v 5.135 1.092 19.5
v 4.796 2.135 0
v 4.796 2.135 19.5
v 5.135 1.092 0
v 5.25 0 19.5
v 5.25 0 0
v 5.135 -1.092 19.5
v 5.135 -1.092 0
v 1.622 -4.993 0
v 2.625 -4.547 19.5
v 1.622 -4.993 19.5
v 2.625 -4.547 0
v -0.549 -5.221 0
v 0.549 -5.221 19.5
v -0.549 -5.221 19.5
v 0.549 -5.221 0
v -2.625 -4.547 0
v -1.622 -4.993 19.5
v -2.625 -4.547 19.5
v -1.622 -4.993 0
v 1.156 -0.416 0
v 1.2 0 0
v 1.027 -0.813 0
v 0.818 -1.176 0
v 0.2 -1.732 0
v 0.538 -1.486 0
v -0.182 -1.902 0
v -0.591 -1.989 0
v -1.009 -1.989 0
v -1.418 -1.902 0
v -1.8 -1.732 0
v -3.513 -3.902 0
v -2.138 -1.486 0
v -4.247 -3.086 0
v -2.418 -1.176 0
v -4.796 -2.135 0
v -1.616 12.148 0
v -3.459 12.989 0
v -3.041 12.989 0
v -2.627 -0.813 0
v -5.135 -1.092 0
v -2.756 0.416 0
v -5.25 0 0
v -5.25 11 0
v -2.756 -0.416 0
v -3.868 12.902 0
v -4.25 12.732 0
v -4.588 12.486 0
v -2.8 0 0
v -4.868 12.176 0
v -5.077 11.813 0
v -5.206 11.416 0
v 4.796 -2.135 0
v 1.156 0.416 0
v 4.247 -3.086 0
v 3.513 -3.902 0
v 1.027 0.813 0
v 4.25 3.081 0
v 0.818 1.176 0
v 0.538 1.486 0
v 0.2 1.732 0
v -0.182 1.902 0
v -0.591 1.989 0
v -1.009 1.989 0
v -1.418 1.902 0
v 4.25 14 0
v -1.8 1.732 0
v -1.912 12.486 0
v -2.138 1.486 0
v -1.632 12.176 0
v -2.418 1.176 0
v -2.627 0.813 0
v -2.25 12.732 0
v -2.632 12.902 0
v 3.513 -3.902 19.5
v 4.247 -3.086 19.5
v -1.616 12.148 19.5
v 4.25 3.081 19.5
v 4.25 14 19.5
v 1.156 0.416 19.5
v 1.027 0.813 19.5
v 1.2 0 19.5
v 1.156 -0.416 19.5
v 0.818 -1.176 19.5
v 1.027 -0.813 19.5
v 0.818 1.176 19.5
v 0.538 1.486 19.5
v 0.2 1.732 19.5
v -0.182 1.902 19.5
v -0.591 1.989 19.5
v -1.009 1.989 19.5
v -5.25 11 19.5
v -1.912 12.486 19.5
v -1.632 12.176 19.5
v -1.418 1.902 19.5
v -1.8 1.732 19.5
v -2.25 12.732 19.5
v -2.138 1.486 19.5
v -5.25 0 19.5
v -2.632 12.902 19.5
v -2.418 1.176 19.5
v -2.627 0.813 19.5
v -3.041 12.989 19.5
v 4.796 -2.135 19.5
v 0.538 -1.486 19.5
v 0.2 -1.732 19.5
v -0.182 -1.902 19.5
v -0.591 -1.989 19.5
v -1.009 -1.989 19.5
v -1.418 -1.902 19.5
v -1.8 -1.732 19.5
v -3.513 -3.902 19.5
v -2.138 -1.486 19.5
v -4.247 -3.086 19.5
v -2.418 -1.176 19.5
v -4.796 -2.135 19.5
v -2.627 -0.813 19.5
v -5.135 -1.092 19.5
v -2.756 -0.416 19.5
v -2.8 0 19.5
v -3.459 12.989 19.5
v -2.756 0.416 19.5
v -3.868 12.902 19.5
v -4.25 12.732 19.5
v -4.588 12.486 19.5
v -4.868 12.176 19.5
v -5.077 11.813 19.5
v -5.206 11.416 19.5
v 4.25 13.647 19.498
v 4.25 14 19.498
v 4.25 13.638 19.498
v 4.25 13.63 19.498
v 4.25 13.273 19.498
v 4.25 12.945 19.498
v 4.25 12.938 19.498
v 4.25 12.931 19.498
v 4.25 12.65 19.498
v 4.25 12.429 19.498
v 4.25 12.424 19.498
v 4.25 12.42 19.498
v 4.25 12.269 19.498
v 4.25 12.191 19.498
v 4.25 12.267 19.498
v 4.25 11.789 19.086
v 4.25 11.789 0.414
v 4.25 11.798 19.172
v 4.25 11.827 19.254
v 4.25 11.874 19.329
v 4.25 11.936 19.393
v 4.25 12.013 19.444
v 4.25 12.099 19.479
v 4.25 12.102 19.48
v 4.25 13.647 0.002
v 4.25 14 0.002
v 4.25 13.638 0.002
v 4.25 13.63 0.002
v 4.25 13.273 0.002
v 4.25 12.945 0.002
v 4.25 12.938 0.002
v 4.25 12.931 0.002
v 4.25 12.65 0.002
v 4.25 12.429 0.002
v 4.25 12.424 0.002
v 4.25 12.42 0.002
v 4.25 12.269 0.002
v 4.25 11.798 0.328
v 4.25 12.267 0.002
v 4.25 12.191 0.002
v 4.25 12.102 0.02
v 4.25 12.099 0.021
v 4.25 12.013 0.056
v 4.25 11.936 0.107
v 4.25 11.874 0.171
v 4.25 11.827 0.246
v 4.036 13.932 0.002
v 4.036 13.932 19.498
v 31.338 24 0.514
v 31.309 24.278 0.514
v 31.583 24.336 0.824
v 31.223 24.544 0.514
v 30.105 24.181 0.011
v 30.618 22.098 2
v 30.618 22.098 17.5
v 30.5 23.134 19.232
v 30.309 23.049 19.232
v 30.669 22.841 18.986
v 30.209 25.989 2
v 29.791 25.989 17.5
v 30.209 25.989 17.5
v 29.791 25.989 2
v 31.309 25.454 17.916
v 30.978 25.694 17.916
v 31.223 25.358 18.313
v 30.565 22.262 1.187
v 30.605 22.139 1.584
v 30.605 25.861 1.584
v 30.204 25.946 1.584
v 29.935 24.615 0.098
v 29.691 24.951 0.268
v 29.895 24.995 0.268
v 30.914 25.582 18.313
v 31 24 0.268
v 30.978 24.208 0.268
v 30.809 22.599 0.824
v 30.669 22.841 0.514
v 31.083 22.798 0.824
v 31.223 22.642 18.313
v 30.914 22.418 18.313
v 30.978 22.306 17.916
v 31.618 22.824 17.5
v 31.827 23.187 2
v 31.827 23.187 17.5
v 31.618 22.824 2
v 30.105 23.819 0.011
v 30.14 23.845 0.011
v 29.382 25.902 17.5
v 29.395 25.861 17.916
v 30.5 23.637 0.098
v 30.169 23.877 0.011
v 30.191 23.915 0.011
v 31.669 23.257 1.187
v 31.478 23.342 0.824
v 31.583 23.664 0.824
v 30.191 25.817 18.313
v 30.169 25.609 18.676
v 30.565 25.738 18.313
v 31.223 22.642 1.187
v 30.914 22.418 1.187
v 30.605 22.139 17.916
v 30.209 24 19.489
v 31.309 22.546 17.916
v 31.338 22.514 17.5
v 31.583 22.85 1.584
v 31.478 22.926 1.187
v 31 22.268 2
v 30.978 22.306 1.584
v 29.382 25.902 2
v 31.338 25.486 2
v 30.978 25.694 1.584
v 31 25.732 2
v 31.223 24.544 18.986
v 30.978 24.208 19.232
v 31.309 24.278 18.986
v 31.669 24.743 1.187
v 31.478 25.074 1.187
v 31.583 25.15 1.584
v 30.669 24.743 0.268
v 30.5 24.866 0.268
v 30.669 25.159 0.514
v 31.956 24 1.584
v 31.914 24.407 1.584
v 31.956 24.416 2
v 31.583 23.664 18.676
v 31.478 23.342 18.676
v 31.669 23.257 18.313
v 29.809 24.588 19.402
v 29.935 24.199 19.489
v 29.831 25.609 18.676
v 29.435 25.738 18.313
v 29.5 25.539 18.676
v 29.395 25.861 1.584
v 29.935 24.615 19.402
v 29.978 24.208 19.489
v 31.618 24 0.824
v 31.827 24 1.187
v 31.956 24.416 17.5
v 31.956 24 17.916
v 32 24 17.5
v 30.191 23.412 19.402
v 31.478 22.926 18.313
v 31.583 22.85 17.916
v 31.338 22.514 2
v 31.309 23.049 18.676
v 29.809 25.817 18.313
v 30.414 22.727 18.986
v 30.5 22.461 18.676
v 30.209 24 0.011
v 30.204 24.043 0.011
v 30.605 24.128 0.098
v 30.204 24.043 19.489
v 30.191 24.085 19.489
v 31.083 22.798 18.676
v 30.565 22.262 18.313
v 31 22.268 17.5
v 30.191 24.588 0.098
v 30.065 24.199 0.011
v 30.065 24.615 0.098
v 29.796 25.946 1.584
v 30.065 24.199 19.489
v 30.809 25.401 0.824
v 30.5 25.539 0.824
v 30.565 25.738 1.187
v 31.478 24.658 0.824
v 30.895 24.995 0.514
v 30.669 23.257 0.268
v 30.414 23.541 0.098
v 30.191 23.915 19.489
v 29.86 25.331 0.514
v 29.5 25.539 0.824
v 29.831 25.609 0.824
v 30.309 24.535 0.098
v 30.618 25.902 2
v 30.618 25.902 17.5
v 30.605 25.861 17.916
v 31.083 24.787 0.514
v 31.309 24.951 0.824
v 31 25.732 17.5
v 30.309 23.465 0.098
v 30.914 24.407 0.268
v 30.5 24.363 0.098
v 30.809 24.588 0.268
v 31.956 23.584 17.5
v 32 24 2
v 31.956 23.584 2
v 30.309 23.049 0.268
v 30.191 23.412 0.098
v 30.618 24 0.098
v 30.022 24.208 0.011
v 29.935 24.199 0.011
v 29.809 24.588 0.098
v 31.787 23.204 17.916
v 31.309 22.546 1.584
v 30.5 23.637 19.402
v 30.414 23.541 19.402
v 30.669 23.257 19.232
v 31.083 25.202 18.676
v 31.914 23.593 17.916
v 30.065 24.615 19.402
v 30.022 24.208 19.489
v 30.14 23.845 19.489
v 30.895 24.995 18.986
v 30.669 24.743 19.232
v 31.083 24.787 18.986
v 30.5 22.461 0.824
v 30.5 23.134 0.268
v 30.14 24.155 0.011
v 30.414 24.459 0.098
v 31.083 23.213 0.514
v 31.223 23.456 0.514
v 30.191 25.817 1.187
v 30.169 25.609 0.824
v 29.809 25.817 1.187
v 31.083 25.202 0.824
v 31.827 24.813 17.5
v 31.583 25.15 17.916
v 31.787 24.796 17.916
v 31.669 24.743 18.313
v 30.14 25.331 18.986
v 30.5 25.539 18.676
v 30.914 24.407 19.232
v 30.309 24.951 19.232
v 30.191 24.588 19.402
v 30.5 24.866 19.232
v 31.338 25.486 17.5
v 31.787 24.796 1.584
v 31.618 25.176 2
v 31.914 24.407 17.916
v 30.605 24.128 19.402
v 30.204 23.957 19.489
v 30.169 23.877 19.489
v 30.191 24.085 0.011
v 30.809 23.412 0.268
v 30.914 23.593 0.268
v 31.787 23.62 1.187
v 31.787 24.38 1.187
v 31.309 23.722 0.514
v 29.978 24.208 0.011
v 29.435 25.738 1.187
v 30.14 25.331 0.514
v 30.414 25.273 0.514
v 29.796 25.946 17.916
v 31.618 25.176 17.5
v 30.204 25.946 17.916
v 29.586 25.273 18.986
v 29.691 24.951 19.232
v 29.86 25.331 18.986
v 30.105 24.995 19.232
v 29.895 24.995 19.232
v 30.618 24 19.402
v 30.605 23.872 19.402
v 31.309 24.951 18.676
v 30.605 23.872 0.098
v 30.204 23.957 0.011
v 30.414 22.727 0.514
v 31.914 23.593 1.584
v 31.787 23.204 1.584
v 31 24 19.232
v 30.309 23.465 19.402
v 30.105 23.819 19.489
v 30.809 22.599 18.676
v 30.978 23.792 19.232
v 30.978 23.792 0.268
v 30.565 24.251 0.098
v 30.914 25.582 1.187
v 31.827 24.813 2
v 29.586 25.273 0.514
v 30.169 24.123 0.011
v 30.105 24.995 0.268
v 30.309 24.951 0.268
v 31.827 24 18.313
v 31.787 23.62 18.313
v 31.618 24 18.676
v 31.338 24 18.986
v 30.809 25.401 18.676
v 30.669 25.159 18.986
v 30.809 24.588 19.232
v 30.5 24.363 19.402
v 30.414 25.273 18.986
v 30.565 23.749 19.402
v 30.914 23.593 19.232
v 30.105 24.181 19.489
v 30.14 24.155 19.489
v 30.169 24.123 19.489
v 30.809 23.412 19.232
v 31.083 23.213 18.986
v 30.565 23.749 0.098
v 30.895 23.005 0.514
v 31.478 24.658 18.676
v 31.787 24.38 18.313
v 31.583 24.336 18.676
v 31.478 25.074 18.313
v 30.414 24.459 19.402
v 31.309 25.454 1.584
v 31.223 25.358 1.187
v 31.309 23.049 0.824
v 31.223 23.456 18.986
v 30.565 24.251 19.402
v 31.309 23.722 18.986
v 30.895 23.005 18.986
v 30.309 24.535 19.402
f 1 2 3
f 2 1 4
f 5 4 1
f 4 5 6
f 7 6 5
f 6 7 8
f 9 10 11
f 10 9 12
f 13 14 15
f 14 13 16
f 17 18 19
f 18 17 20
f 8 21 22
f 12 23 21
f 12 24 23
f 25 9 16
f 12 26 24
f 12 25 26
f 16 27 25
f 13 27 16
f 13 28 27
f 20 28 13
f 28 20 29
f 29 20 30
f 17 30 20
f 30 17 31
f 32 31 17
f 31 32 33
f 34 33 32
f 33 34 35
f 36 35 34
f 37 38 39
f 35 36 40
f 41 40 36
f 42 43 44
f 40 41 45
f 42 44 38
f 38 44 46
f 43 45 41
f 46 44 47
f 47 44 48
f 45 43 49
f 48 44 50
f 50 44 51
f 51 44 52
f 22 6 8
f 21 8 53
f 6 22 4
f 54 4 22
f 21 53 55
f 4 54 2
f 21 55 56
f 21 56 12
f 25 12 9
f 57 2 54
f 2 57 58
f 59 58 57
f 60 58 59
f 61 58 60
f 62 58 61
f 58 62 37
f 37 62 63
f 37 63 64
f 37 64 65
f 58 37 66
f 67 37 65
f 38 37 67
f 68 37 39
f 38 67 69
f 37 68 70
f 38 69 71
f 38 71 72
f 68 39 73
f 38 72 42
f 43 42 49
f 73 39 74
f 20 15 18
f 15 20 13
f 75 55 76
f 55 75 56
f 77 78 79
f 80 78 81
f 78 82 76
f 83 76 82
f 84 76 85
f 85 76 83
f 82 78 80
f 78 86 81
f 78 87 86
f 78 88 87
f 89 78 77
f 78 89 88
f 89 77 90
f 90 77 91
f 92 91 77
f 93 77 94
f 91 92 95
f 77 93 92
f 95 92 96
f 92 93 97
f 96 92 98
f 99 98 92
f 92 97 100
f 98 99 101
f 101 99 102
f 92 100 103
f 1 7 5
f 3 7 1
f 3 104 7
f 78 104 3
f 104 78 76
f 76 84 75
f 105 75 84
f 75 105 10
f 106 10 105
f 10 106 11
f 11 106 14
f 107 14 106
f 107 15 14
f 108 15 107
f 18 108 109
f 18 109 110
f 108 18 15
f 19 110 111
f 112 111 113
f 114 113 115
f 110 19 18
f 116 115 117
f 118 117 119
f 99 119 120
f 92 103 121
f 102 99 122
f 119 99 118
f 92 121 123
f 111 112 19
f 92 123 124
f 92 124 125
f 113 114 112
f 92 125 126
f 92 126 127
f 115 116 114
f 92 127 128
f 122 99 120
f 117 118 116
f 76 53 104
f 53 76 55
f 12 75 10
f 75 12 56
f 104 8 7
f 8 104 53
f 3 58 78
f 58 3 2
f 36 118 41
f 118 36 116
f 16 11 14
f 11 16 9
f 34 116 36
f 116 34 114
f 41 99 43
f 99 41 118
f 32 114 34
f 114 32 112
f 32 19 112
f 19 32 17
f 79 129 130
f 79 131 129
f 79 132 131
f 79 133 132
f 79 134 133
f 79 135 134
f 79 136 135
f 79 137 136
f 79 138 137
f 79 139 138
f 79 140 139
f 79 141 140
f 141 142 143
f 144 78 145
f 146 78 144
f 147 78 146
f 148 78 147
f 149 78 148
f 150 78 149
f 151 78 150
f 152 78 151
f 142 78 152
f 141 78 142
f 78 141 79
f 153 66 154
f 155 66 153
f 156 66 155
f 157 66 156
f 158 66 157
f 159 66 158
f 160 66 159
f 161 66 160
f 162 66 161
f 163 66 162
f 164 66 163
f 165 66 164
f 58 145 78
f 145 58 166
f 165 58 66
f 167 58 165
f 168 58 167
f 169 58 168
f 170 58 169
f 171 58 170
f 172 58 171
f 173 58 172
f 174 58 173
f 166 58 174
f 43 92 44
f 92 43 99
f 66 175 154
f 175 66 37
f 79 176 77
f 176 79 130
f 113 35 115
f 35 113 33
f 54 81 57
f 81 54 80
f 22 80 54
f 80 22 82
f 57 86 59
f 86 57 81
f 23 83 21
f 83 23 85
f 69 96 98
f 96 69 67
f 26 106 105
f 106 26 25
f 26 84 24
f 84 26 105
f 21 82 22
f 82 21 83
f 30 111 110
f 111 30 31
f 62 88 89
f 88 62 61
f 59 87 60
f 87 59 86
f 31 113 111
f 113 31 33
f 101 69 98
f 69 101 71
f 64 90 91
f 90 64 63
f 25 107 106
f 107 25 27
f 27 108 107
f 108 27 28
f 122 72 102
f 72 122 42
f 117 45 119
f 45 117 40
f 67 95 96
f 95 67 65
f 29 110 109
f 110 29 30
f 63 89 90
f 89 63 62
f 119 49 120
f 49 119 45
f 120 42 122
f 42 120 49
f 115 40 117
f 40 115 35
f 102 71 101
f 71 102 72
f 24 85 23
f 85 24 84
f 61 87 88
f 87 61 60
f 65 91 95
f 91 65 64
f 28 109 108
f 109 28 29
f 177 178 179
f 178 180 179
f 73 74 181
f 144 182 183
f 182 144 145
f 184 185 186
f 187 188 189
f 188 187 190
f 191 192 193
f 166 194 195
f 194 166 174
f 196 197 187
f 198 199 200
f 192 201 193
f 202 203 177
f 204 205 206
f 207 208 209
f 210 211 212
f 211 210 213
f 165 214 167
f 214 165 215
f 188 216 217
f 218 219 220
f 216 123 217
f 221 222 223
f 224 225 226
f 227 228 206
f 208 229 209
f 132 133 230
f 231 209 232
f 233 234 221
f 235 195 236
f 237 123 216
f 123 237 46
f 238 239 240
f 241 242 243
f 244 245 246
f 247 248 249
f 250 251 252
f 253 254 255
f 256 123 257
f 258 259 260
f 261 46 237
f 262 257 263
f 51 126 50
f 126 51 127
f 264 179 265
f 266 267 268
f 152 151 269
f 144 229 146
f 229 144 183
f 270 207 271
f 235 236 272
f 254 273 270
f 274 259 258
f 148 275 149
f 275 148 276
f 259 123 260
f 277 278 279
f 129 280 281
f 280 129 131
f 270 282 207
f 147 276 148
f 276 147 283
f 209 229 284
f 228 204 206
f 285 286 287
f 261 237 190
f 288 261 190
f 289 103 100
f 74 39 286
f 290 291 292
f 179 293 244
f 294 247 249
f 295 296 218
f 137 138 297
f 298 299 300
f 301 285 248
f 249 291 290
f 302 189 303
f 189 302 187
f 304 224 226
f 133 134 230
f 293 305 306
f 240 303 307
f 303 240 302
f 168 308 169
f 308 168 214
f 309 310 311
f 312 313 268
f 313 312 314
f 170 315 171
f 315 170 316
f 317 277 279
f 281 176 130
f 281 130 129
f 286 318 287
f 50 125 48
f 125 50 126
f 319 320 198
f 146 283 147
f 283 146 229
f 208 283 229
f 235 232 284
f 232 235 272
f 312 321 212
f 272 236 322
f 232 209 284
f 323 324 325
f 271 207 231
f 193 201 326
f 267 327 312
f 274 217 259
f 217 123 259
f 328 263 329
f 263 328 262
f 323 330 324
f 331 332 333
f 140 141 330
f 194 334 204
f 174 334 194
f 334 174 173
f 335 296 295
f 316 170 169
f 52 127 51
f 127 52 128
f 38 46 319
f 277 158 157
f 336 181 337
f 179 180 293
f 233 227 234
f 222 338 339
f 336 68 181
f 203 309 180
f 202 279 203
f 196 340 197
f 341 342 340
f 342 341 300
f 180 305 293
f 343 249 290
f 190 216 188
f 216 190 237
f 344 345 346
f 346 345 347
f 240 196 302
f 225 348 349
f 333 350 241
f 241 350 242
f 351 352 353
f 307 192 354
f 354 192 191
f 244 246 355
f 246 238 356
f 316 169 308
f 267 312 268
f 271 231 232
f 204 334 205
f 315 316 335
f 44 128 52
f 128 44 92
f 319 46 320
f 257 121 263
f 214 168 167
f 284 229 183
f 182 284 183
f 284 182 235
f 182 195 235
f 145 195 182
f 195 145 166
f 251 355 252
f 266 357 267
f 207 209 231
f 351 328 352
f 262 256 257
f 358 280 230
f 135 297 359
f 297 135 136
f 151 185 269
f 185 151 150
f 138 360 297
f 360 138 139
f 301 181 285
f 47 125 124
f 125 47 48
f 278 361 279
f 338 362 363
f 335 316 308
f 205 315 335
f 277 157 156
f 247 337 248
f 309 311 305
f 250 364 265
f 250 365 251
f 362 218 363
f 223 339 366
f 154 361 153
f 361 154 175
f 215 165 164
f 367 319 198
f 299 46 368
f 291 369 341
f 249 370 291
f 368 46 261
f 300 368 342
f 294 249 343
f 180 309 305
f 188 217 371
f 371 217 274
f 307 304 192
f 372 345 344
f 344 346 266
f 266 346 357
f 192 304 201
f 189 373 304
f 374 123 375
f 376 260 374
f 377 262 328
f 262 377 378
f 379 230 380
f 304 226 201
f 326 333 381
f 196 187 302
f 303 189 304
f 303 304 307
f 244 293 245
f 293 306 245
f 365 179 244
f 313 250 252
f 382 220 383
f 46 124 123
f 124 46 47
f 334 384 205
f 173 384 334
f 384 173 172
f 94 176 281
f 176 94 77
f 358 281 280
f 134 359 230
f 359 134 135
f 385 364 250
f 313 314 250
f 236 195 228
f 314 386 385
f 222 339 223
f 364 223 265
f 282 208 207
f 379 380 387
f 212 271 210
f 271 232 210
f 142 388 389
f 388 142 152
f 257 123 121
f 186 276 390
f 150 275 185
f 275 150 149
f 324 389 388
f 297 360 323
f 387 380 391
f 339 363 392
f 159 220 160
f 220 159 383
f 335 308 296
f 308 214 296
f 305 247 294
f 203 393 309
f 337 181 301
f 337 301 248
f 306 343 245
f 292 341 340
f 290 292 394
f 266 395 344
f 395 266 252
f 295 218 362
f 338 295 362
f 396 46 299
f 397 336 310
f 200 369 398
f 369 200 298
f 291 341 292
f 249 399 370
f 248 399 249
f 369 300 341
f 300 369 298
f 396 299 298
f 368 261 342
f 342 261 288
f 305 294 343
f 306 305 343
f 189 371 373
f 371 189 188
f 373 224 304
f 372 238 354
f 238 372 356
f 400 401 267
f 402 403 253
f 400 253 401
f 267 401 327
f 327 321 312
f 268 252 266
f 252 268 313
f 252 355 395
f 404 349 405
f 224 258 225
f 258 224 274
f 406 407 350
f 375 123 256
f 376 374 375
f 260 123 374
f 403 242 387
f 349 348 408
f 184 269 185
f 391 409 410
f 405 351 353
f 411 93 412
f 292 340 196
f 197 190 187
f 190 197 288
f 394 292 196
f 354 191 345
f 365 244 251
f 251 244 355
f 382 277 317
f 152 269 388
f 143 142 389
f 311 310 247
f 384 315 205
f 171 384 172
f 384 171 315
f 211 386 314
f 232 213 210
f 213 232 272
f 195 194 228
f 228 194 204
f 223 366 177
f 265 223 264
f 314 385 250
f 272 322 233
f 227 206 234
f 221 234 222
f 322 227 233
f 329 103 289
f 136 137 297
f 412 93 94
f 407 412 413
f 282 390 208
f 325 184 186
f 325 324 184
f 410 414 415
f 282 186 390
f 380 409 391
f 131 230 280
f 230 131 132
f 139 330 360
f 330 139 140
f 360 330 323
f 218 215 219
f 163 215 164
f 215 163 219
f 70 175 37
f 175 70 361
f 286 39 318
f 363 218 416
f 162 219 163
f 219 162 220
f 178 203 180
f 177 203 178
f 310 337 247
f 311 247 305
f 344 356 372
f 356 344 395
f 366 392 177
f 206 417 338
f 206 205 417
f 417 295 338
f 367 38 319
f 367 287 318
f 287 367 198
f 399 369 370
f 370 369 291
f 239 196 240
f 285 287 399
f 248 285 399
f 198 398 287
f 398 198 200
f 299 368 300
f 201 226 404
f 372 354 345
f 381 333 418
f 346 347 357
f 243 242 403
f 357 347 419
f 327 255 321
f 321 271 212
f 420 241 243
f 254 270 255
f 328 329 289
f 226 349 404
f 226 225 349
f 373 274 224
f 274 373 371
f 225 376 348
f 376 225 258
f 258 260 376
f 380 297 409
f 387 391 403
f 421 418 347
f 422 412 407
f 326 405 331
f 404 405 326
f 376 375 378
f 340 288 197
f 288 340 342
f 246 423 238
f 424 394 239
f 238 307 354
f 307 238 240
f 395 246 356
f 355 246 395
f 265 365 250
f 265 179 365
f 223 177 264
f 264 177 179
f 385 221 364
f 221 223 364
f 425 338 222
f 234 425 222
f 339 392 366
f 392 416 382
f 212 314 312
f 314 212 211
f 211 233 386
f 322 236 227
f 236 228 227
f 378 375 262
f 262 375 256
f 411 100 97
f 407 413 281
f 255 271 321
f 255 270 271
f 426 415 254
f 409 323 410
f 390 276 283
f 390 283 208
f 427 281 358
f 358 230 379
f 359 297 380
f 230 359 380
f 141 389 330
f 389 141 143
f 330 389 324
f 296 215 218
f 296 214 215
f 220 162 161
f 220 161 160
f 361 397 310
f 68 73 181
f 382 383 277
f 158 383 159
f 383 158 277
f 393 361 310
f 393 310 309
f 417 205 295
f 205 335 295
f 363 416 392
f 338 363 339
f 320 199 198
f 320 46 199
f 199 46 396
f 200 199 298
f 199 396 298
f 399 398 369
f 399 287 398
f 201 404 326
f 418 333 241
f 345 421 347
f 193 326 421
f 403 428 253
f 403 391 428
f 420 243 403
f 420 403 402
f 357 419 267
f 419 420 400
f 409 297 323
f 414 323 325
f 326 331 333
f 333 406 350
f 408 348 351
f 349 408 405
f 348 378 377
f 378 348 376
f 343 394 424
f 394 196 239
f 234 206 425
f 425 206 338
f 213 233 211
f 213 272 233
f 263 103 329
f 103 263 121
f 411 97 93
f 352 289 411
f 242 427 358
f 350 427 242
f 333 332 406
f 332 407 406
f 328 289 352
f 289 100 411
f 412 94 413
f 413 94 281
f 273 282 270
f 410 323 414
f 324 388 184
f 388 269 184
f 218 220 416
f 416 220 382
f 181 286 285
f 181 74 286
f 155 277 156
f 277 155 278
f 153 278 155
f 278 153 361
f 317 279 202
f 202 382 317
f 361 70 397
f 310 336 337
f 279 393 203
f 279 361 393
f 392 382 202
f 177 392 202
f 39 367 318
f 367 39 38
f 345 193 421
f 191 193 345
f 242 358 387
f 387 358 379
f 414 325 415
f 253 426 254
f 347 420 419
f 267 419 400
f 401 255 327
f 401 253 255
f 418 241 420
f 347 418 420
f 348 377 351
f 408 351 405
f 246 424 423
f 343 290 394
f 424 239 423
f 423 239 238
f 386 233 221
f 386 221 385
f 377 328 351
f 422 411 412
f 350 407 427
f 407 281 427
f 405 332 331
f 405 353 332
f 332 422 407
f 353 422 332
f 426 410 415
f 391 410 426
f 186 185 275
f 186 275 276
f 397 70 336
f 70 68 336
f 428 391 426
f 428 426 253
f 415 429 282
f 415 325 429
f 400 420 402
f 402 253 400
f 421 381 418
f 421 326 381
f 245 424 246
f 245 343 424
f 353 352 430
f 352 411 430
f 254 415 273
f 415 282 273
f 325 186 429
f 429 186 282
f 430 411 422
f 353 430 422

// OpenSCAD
altura=19.5;
x1=10.5;//presilla
x2=9.5; //cubo
x3=4;//pasante
py1=9;
py2=py1+4;
py3=22;
py4=py3+4;
px1=30;
diametroPresilla=4;
rp=diametroPresilla/2;

CubePoints1 = [
  [ -x1/2,  0,  0 ],  //0
  [ -x1/2+x2,  0,  0 ],  //1
  [ -x1/2+x2,  14,  0 ],  //2
  [  -x1/2,  11,  0 ],  //3
  [  -x1/2,  0,  altura ],  //4
  [ -x1/2+x2,  0,  altura ],  //5
  [ -x1/2+x2,  14,  altura ],  //6
  [  -x1/2,  11,  altura ]]; //7
  
CubeFaces = [
  [0,1,2,3],  // bottom
  [4,5,1,0],  // front
  [7,6,5,4],  // top
  [5,6,2,1],  // right
  [6,7,3,2],  // back
  [7,4,0,3]]; // left

$fn=30;

difference(){

union(){
cylinder(h=altura,d=x1);
polyhedron( CubePoints1, CubeFaces );
    }
translate([-0.8,0,0])
cylinder(h=altura*3, d=x3, center=true);
}

hull(){
translate([ (-x1/2)+rp,  py2-rp,  0 ])
cylinder(h=altura,d=4);
    
translate([ px1,  py4-rp,  rp ])
sphere(rp);
    
translate([ px1,  py4-rp,  altura-rp ])
sphere(rp);
}
